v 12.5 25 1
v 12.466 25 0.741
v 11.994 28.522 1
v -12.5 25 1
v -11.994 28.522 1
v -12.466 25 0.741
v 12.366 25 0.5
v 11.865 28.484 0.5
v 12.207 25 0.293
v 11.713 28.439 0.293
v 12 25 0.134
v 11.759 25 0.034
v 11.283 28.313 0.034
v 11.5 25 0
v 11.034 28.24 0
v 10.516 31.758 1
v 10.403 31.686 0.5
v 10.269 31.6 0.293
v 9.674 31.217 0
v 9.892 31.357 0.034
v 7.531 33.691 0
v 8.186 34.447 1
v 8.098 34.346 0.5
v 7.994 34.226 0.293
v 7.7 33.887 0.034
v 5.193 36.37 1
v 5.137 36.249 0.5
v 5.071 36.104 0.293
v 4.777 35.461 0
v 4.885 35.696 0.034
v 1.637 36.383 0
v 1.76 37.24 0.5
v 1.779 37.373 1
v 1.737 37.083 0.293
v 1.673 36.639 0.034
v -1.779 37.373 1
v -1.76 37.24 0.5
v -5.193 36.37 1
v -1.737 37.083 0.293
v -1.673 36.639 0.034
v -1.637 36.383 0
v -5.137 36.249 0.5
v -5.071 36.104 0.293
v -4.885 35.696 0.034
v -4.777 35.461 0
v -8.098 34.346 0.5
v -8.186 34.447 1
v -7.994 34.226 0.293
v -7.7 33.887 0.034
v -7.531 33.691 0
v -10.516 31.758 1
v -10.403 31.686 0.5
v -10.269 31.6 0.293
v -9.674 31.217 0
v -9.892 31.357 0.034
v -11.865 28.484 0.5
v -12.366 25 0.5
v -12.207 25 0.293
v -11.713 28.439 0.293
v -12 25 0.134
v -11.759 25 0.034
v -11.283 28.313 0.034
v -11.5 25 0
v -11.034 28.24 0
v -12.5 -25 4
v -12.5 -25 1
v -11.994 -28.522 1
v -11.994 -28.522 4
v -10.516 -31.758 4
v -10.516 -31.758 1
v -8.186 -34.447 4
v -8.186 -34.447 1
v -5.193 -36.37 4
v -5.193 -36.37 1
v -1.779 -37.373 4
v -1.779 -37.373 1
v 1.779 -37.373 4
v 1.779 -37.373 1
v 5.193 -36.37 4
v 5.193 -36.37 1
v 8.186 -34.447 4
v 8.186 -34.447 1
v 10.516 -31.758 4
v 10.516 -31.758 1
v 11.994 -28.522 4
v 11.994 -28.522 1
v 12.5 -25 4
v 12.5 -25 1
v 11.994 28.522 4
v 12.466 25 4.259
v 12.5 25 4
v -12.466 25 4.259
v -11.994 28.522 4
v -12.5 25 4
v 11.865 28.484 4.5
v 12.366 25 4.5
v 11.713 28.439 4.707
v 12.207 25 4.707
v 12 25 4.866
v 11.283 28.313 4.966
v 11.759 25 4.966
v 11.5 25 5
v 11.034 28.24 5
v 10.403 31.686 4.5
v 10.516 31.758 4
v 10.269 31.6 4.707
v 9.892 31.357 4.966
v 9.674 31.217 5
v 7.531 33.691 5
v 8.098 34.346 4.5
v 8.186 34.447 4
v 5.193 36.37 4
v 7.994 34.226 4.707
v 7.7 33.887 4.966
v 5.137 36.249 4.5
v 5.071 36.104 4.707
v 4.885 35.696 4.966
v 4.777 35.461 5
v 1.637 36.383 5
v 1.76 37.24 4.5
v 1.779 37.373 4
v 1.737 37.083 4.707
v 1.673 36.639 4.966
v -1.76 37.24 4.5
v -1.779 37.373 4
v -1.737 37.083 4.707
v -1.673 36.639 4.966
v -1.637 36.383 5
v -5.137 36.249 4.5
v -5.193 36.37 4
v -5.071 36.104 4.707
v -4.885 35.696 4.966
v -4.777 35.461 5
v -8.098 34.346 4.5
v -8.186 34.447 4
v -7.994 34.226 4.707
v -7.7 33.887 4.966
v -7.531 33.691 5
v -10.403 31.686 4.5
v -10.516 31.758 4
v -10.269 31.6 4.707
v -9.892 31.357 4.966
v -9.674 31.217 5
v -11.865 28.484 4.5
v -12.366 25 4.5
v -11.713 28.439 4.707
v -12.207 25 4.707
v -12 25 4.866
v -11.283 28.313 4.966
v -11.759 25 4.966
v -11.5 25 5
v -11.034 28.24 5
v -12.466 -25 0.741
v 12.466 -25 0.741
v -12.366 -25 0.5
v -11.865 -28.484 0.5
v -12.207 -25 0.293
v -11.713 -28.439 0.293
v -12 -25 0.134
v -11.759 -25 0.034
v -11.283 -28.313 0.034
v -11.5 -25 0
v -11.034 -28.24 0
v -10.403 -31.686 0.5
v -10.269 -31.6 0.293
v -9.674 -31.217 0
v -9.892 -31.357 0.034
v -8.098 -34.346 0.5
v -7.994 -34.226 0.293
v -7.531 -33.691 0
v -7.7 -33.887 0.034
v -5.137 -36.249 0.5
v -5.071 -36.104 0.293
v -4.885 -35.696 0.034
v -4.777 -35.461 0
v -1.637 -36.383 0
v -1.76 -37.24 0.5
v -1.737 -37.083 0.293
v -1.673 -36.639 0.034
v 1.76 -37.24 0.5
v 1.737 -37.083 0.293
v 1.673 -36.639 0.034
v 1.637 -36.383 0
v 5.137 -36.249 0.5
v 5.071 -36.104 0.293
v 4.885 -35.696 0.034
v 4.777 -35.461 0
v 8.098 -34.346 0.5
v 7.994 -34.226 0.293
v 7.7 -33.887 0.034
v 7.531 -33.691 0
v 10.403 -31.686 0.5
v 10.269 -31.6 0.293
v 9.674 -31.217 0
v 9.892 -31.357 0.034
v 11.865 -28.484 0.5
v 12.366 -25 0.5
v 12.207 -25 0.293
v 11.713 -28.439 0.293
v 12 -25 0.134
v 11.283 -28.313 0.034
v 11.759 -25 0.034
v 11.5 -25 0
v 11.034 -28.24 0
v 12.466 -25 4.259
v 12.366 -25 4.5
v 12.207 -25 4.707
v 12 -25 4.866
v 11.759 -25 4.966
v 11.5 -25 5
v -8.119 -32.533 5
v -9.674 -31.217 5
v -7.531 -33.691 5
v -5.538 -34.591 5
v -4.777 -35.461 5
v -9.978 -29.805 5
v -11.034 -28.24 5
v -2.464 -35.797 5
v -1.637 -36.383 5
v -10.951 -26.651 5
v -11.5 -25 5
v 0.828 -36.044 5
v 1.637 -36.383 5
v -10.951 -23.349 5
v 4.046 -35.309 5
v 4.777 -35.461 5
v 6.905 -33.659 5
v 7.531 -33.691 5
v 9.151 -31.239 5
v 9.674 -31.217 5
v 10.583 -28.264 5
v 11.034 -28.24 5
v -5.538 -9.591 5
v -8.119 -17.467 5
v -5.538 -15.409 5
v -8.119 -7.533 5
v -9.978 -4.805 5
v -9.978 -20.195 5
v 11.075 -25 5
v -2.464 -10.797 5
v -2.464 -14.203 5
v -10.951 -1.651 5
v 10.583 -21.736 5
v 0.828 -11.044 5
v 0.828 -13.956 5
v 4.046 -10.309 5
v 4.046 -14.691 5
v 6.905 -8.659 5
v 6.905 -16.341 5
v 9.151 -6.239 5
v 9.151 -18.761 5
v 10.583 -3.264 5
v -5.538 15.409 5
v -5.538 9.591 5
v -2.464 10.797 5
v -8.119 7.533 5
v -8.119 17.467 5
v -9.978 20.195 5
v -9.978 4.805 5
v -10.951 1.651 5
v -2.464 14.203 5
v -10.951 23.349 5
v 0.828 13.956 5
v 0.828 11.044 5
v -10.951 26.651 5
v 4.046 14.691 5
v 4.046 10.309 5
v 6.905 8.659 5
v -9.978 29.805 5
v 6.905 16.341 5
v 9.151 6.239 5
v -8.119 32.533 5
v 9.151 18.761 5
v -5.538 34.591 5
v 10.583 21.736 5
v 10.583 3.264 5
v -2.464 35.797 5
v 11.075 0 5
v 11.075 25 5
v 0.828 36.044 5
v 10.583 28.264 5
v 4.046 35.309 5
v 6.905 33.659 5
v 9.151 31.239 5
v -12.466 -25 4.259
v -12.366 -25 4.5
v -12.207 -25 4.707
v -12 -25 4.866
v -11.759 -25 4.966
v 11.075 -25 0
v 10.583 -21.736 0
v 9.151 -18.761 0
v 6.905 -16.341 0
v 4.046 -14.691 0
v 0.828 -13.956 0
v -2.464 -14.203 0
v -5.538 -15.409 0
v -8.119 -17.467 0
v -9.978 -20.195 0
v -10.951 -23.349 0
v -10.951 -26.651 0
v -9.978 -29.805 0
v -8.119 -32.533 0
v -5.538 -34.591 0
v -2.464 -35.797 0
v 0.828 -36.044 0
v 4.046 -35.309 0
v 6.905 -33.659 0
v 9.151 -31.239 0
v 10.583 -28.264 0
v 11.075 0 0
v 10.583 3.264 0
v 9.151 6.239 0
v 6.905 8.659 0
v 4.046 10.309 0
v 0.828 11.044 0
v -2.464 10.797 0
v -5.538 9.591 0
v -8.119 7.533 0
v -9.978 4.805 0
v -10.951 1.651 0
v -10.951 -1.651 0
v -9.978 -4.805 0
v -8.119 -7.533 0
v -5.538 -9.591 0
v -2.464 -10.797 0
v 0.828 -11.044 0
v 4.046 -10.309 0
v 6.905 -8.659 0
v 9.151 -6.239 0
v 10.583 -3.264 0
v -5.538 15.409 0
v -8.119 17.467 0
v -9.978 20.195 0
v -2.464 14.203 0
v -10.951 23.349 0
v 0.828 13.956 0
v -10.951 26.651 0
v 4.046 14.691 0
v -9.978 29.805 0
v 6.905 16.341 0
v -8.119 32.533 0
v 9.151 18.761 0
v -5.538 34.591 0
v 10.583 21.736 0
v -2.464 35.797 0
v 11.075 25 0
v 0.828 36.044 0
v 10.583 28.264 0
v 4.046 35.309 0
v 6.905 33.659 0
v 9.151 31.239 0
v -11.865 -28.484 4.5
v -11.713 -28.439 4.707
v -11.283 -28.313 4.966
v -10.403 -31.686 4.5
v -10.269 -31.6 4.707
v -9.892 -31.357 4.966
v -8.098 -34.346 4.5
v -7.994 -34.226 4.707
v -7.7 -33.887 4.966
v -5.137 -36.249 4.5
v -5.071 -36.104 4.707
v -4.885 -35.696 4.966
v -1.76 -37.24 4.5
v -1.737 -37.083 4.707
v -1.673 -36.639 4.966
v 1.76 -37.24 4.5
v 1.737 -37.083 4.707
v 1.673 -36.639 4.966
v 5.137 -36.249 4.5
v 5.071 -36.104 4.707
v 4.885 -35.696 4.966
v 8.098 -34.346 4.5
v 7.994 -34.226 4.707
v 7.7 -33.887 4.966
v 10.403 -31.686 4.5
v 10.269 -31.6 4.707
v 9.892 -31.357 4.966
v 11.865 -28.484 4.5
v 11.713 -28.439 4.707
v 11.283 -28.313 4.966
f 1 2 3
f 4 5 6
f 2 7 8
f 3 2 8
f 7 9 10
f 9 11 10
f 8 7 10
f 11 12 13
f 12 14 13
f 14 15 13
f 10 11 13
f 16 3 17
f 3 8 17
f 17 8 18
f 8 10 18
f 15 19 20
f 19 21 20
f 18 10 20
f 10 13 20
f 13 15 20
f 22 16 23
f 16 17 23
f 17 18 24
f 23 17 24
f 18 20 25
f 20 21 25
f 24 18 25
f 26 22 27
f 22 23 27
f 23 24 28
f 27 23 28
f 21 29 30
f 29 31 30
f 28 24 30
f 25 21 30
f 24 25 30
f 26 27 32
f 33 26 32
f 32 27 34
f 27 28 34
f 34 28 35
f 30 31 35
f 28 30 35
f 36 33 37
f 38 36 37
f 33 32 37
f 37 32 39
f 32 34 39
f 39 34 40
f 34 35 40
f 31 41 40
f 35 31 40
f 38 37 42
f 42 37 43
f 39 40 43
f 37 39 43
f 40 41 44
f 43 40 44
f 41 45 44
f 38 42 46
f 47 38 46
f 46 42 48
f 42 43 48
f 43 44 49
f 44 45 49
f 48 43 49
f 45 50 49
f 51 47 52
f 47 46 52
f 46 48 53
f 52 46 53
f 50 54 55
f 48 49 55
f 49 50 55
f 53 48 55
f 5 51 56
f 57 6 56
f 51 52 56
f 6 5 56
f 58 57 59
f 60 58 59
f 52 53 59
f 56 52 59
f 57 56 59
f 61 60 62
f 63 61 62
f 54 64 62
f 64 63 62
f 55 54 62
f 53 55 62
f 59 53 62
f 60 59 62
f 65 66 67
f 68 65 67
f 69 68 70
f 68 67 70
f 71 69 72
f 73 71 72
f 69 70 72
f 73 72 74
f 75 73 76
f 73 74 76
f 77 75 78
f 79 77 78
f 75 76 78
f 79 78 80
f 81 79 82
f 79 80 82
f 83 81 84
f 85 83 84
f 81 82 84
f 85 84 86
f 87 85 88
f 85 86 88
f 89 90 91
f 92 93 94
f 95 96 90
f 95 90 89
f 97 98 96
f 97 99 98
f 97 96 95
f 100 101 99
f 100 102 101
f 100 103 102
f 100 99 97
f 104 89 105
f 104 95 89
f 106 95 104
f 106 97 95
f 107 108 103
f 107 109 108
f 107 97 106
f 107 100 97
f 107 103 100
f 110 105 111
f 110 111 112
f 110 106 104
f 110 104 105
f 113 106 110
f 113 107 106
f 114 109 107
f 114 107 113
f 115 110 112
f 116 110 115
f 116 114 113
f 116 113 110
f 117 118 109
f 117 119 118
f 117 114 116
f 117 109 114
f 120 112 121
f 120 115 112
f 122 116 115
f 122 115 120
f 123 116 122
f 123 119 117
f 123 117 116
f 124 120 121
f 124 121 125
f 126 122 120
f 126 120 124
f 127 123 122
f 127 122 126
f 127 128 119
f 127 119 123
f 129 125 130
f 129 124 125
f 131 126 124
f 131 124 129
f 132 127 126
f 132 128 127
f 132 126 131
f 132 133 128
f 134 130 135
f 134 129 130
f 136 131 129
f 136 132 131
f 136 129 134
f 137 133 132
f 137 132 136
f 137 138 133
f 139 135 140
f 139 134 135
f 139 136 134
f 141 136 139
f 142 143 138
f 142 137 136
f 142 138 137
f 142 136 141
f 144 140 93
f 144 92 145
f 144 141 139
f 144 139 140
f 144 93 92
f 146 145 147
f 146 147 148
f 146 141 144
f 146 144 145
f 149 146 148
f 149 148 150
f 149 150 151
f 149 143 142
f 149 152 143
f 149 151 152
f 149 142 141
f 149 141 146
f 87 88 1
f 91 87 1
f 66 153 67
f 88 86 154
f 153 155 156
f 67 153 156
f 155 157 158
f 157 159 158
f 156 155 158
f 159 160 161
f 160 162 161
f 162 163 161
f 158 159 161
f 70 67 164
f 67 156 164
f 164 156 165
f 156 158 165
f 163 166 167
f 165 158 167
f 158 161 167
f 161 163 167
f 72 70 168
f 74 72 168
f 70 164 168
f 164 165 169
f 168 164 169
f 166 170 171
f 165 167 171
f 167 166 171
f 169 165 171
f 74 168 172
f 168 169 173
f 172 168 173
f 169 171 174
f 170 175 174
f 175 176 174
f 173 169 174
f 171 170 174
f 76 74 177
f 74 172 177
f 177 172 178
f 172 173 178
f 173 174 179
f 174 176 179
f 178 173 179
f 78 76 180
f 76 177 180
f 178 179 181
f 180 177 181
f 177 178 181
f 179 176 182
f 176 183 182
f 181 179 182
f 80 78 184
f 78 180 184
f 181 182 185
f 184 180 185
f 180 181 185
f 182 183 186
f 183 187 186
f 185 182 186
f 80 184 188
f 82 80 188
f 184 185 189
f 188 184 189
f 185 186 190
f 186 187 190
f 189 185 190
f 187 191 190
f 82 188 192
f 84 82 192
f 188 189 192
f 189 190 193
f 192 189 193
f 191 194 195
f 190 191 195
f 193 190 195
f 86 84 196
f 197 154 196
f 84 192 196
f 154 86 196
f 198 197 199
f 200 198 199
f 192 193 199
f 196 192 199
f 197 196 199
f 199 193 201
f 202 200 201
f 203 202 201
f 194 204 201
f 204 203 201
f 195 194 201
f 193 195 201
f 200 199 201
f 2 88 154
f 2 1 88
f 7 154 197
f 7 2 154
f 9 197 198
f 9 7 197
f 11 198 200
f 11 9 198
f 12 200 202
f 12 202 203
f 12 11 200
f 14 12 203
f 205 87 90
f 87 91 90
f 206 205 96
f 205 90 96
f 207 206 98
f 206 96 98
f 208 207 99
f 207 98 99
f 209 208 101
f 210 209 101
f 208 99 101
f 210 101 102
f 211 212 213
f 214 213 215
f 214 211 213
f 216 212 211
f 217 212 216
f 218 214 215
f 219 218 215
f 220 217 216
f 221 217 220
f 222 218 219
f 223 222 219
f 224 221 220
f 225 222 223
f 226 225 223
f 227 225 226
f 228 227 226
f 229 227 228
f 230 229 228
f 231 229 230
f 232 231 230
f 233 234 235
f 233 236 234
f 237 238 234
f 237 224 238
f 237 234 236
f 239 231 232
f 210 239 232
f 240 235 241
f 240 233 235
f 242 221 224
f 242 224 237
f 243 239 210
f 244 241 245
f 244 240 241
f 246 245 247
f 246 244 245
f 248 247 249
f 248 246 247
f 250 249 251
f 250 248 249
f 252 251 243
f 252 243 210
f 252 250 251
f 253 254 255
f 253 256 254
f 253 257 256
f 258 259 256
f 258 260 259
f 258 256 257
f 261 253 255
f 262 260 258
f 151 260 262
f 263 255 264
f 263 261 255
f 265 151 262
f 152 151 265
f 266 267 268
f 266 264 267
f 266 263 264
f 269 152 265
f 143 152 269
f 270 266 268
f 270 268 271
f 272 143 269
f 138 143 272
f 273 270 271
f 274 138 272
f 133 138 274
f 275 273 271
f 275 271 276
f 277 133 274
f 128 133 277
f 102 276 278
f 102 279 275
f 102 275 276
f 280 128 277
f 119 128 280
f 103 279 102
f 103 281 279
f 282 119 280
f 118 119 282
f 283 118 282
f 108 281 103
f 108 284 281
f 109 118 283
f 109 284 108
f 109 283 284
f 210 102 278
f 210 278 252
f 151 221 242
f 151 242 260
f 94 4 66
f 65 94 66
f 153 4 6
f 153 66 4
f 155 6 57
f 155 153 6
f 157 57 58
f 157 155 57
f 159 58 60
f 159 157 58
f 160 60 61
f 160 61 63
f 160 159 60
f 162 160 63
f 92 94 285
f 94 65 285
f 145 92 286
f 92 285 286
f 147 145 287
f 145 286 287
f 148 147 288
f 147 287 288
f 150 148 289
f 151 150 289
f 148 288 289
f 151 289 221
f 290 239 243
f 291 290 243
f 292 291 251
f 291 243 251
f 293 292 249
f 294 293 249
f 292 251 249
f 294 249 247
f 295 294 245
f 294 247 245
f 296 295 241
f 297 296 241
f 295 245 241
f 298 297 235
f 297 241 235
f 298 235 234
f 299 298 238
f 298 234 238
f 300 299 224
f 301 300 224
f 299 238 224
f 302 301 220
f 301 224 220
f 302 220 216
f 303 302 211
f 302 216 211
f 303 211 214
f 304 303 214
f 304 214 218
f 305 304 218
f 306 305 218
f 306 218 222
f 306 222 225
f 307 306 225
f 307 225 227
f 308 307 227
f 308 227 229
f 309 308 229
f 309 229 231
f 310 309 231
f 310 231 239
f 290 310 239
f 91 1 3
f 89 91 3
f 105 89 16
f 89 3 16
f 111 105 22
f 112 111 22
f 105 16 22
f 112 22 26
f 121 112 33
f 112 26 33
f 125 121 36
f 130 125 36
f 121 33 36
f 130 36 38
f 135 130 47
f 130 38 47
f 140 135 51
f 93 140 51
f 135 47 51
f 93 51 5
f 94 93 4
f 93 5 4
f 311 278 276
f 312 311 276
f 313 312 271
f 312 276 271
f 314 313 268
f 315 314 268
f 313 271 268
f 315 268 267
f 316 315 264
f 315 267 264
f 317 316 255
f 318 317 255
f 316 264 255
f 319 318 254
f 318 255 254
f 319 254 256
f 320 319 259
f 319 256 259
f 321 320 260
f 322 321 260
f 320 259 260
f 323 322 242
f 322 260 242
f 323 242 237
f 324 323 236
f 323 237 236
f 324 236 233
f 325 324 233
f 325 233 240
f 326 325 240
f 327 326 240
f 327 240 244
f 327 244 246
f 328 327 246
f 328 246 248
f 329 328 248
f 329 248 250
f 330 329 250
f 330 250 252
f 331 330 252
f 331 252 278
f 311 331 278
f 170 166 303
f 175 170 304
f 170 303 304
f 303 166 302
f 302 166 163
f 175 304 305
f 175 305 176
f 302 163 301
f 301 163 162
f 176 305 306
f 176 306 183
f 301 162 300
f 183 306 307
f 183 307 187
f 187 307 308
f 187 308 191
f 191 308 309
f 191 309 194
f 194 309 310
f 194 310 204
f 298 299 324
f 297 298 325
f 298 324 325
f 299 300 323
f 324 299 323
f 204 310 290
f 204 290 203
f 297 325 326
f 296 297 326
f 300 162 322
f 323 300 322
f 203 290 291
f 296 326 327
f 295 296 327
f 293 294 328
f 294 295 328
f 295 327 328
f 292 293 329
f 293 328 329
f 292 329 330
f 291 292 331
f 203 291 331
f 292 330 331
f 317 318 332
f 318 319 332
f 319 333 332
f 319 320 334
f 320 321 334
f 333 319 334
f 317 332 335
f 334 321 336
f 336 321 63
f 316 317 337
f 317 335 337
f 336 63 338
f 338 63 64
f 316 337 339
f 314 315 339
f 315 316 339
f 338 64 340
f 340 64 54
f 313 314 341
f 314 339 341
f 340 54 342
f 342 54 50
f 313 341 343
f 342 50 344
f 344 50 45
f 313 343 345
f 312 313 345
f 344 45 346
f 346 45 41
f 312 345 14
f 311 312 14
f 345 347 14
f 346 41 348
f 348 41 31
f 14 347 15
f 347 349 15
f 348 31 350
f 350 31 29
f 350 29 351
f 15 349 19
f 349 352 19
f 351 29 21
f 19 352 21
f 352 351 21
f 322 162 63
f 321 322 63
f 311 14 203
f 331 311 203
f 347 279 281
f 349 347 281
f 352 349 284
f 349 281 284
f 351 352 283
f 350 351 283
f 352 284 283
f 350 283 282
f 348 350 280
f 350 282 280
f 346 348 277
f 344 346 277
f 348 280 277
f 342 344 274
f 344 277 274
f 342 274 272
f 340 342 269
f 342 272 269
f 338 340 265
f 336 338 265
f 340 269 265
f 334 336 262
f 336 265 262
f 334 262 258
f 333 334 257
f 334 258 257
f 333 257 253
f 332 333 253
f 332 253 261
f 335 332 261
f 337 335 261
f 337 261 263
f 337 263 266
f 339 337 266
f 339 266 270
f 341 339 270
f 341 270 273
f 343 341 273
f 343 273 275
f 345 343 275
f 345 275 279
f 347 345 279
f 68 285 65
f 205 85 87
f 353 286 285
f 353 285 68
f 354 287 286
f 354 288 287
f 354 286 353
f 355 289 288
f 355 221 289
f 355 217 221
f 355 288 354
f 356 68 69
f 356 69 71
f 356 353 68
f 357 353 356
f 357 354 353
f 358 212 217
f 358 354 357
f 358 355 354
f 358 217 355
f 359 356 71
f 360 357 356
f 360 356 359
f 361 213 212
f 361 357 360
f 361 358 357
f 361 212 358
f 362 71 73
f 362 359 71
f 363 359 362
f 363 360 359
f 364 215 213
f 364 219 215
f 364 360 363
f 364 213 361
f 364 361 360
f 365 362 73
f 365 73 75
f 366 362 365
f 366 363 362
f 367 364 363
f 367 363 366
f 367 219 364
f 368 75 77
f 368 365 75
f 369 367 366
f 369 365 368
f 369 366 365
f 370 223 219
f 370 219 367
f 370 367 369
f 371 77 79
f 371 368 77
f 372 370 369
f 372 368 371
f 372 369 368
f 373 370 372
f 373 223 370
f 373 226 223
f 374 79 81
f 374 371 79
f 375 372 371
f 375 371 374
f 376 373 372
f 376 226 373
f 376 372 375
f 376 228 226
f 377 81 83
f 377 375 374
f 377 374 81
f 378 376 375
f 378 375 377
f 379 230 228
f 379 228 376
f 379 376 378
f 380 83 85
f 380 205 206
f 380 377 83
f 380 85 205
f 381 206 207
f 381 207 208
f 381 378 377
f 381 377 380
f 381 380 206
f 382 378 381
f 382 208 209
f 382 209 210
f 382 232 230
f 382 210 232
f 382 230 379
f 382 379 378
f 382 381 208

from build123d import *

# Parameters (mm, degrees)
F1_DEPTH = 5
F2_R     = 11.075
F3_DEPTH = 25
F4_R     = 1


with BuildPart() as f1:
    # F0 (on Top) → F1 (new body)
    with BuildSketch(Plane.XY):
        with BuildLine():
            ThreePointArc((-12.5, -25), (0, -37.5), (12.5, -25))
            Line((12.5, -25), (-12.5, -25))
        make_face()
        with BuildLine():
            Line((-12.5, 25), (12.5, 25))
            ThreePointArc((12.5, 25), (0, 37.5), (-12.5, 25))
        make_face()
        with BuildLine():
            Line((12.5, -25), (12.5, 0))
            ThreePointArc((12.5, 0), (8.838835, -8.838835), (0, -12.5))
            ThreePointArc((0, -12.5), (8.838835, -16.161165), (12.5, -25))
        make_face()
        with BuildLine():
            ThreePointArc((-12.5, -25), (-8.838835, -16.161165), (0, -12.5))
            ThreePointArc((0, -12.5), (-8.838835, -8.838835), (-12.5, 0))
            Line((-12.5, 0), (-12.5, -25))
        make_face()
        with BuildLine():
            ThreePointArc((-12.5, 0), (-8.838835, 8.838835), (0, 12.5))
            ThreePointArc((0, 12.5), (-8.838835, 16.161165), (-12.5, 25))
            Line((-12.5, 25), (-12.5, 0))
        make_face()
        with BuildLine():
            ThreePointArc((0, 12.5), (8.838835, 8.838835), (12.5, 0))
            Line((12.5, 0), (12.5, 25))
            ThreePointArc((12.5, 25), (8.838835, 16.161165), (0, 12.5))
        make_face()
        with BuildLine():
            ThreePointArc((-12.5, 25), (-8.838835, 16.161165), (0, 12.5))
            ThreePointArc((0, 12.5), (8.838835, 16.161165), (12.5, 25))
            Line((12.5, 25), (-12.5, 25))
        make_face()
        with BuildLine():
            ThreePointArc((12.5, -25), (8.838835, -16.161165), (0, -12.5))
            ThreePointArc((0, -12.5), (-8.838835, -16.161165), (-12.5, -25))
            Line((-12.5, -25), (12.5, -25))
        make_face()
        with BuildLine():
            ThreePointArc((0, -12.5), (8.838835, -8.838835), (12.5, 0))
            ThreePointArc((12.5, 0), (8.838835, 8.838835), (0, 12.5))
            ThreePointArc((0, 12.5), (-8.838835, 8.838835), (-12.5, 0))
            ThreePointArc((-12.5, 0), (-8.838835, -8.838835), (0, -12.5))
        make_face()
    extrude(amount=F1_DEPTH)

    # F2 (on face) → F3 (cut)
    with BuildSketch(Plane.XY.offset(5)):
        with Locations((0, 25)):
            Circle(F2_R)
        Circle(F2_R)
        with Locations((0, -25)):
            Circle(F2_R)
    extrude(amount=-F3_DEPTH, mode=Mode.SUBTRACT)

    # F4
    f4_edges = [f1.edges().sort_by_distance(p)[0] for p in [
        (12.5, 0, 5),
        (0, 37.5, 5),
        (-12.5, 0, 5),
        (-12.5, -25, 2.5),
        (-12.5, 0, 0),
        (-12.5, 25, 2.5),
        (12.5, 0, 0),
    ]]
    fillet(f4_edges, radius=F4_R)


solid = f1.part
